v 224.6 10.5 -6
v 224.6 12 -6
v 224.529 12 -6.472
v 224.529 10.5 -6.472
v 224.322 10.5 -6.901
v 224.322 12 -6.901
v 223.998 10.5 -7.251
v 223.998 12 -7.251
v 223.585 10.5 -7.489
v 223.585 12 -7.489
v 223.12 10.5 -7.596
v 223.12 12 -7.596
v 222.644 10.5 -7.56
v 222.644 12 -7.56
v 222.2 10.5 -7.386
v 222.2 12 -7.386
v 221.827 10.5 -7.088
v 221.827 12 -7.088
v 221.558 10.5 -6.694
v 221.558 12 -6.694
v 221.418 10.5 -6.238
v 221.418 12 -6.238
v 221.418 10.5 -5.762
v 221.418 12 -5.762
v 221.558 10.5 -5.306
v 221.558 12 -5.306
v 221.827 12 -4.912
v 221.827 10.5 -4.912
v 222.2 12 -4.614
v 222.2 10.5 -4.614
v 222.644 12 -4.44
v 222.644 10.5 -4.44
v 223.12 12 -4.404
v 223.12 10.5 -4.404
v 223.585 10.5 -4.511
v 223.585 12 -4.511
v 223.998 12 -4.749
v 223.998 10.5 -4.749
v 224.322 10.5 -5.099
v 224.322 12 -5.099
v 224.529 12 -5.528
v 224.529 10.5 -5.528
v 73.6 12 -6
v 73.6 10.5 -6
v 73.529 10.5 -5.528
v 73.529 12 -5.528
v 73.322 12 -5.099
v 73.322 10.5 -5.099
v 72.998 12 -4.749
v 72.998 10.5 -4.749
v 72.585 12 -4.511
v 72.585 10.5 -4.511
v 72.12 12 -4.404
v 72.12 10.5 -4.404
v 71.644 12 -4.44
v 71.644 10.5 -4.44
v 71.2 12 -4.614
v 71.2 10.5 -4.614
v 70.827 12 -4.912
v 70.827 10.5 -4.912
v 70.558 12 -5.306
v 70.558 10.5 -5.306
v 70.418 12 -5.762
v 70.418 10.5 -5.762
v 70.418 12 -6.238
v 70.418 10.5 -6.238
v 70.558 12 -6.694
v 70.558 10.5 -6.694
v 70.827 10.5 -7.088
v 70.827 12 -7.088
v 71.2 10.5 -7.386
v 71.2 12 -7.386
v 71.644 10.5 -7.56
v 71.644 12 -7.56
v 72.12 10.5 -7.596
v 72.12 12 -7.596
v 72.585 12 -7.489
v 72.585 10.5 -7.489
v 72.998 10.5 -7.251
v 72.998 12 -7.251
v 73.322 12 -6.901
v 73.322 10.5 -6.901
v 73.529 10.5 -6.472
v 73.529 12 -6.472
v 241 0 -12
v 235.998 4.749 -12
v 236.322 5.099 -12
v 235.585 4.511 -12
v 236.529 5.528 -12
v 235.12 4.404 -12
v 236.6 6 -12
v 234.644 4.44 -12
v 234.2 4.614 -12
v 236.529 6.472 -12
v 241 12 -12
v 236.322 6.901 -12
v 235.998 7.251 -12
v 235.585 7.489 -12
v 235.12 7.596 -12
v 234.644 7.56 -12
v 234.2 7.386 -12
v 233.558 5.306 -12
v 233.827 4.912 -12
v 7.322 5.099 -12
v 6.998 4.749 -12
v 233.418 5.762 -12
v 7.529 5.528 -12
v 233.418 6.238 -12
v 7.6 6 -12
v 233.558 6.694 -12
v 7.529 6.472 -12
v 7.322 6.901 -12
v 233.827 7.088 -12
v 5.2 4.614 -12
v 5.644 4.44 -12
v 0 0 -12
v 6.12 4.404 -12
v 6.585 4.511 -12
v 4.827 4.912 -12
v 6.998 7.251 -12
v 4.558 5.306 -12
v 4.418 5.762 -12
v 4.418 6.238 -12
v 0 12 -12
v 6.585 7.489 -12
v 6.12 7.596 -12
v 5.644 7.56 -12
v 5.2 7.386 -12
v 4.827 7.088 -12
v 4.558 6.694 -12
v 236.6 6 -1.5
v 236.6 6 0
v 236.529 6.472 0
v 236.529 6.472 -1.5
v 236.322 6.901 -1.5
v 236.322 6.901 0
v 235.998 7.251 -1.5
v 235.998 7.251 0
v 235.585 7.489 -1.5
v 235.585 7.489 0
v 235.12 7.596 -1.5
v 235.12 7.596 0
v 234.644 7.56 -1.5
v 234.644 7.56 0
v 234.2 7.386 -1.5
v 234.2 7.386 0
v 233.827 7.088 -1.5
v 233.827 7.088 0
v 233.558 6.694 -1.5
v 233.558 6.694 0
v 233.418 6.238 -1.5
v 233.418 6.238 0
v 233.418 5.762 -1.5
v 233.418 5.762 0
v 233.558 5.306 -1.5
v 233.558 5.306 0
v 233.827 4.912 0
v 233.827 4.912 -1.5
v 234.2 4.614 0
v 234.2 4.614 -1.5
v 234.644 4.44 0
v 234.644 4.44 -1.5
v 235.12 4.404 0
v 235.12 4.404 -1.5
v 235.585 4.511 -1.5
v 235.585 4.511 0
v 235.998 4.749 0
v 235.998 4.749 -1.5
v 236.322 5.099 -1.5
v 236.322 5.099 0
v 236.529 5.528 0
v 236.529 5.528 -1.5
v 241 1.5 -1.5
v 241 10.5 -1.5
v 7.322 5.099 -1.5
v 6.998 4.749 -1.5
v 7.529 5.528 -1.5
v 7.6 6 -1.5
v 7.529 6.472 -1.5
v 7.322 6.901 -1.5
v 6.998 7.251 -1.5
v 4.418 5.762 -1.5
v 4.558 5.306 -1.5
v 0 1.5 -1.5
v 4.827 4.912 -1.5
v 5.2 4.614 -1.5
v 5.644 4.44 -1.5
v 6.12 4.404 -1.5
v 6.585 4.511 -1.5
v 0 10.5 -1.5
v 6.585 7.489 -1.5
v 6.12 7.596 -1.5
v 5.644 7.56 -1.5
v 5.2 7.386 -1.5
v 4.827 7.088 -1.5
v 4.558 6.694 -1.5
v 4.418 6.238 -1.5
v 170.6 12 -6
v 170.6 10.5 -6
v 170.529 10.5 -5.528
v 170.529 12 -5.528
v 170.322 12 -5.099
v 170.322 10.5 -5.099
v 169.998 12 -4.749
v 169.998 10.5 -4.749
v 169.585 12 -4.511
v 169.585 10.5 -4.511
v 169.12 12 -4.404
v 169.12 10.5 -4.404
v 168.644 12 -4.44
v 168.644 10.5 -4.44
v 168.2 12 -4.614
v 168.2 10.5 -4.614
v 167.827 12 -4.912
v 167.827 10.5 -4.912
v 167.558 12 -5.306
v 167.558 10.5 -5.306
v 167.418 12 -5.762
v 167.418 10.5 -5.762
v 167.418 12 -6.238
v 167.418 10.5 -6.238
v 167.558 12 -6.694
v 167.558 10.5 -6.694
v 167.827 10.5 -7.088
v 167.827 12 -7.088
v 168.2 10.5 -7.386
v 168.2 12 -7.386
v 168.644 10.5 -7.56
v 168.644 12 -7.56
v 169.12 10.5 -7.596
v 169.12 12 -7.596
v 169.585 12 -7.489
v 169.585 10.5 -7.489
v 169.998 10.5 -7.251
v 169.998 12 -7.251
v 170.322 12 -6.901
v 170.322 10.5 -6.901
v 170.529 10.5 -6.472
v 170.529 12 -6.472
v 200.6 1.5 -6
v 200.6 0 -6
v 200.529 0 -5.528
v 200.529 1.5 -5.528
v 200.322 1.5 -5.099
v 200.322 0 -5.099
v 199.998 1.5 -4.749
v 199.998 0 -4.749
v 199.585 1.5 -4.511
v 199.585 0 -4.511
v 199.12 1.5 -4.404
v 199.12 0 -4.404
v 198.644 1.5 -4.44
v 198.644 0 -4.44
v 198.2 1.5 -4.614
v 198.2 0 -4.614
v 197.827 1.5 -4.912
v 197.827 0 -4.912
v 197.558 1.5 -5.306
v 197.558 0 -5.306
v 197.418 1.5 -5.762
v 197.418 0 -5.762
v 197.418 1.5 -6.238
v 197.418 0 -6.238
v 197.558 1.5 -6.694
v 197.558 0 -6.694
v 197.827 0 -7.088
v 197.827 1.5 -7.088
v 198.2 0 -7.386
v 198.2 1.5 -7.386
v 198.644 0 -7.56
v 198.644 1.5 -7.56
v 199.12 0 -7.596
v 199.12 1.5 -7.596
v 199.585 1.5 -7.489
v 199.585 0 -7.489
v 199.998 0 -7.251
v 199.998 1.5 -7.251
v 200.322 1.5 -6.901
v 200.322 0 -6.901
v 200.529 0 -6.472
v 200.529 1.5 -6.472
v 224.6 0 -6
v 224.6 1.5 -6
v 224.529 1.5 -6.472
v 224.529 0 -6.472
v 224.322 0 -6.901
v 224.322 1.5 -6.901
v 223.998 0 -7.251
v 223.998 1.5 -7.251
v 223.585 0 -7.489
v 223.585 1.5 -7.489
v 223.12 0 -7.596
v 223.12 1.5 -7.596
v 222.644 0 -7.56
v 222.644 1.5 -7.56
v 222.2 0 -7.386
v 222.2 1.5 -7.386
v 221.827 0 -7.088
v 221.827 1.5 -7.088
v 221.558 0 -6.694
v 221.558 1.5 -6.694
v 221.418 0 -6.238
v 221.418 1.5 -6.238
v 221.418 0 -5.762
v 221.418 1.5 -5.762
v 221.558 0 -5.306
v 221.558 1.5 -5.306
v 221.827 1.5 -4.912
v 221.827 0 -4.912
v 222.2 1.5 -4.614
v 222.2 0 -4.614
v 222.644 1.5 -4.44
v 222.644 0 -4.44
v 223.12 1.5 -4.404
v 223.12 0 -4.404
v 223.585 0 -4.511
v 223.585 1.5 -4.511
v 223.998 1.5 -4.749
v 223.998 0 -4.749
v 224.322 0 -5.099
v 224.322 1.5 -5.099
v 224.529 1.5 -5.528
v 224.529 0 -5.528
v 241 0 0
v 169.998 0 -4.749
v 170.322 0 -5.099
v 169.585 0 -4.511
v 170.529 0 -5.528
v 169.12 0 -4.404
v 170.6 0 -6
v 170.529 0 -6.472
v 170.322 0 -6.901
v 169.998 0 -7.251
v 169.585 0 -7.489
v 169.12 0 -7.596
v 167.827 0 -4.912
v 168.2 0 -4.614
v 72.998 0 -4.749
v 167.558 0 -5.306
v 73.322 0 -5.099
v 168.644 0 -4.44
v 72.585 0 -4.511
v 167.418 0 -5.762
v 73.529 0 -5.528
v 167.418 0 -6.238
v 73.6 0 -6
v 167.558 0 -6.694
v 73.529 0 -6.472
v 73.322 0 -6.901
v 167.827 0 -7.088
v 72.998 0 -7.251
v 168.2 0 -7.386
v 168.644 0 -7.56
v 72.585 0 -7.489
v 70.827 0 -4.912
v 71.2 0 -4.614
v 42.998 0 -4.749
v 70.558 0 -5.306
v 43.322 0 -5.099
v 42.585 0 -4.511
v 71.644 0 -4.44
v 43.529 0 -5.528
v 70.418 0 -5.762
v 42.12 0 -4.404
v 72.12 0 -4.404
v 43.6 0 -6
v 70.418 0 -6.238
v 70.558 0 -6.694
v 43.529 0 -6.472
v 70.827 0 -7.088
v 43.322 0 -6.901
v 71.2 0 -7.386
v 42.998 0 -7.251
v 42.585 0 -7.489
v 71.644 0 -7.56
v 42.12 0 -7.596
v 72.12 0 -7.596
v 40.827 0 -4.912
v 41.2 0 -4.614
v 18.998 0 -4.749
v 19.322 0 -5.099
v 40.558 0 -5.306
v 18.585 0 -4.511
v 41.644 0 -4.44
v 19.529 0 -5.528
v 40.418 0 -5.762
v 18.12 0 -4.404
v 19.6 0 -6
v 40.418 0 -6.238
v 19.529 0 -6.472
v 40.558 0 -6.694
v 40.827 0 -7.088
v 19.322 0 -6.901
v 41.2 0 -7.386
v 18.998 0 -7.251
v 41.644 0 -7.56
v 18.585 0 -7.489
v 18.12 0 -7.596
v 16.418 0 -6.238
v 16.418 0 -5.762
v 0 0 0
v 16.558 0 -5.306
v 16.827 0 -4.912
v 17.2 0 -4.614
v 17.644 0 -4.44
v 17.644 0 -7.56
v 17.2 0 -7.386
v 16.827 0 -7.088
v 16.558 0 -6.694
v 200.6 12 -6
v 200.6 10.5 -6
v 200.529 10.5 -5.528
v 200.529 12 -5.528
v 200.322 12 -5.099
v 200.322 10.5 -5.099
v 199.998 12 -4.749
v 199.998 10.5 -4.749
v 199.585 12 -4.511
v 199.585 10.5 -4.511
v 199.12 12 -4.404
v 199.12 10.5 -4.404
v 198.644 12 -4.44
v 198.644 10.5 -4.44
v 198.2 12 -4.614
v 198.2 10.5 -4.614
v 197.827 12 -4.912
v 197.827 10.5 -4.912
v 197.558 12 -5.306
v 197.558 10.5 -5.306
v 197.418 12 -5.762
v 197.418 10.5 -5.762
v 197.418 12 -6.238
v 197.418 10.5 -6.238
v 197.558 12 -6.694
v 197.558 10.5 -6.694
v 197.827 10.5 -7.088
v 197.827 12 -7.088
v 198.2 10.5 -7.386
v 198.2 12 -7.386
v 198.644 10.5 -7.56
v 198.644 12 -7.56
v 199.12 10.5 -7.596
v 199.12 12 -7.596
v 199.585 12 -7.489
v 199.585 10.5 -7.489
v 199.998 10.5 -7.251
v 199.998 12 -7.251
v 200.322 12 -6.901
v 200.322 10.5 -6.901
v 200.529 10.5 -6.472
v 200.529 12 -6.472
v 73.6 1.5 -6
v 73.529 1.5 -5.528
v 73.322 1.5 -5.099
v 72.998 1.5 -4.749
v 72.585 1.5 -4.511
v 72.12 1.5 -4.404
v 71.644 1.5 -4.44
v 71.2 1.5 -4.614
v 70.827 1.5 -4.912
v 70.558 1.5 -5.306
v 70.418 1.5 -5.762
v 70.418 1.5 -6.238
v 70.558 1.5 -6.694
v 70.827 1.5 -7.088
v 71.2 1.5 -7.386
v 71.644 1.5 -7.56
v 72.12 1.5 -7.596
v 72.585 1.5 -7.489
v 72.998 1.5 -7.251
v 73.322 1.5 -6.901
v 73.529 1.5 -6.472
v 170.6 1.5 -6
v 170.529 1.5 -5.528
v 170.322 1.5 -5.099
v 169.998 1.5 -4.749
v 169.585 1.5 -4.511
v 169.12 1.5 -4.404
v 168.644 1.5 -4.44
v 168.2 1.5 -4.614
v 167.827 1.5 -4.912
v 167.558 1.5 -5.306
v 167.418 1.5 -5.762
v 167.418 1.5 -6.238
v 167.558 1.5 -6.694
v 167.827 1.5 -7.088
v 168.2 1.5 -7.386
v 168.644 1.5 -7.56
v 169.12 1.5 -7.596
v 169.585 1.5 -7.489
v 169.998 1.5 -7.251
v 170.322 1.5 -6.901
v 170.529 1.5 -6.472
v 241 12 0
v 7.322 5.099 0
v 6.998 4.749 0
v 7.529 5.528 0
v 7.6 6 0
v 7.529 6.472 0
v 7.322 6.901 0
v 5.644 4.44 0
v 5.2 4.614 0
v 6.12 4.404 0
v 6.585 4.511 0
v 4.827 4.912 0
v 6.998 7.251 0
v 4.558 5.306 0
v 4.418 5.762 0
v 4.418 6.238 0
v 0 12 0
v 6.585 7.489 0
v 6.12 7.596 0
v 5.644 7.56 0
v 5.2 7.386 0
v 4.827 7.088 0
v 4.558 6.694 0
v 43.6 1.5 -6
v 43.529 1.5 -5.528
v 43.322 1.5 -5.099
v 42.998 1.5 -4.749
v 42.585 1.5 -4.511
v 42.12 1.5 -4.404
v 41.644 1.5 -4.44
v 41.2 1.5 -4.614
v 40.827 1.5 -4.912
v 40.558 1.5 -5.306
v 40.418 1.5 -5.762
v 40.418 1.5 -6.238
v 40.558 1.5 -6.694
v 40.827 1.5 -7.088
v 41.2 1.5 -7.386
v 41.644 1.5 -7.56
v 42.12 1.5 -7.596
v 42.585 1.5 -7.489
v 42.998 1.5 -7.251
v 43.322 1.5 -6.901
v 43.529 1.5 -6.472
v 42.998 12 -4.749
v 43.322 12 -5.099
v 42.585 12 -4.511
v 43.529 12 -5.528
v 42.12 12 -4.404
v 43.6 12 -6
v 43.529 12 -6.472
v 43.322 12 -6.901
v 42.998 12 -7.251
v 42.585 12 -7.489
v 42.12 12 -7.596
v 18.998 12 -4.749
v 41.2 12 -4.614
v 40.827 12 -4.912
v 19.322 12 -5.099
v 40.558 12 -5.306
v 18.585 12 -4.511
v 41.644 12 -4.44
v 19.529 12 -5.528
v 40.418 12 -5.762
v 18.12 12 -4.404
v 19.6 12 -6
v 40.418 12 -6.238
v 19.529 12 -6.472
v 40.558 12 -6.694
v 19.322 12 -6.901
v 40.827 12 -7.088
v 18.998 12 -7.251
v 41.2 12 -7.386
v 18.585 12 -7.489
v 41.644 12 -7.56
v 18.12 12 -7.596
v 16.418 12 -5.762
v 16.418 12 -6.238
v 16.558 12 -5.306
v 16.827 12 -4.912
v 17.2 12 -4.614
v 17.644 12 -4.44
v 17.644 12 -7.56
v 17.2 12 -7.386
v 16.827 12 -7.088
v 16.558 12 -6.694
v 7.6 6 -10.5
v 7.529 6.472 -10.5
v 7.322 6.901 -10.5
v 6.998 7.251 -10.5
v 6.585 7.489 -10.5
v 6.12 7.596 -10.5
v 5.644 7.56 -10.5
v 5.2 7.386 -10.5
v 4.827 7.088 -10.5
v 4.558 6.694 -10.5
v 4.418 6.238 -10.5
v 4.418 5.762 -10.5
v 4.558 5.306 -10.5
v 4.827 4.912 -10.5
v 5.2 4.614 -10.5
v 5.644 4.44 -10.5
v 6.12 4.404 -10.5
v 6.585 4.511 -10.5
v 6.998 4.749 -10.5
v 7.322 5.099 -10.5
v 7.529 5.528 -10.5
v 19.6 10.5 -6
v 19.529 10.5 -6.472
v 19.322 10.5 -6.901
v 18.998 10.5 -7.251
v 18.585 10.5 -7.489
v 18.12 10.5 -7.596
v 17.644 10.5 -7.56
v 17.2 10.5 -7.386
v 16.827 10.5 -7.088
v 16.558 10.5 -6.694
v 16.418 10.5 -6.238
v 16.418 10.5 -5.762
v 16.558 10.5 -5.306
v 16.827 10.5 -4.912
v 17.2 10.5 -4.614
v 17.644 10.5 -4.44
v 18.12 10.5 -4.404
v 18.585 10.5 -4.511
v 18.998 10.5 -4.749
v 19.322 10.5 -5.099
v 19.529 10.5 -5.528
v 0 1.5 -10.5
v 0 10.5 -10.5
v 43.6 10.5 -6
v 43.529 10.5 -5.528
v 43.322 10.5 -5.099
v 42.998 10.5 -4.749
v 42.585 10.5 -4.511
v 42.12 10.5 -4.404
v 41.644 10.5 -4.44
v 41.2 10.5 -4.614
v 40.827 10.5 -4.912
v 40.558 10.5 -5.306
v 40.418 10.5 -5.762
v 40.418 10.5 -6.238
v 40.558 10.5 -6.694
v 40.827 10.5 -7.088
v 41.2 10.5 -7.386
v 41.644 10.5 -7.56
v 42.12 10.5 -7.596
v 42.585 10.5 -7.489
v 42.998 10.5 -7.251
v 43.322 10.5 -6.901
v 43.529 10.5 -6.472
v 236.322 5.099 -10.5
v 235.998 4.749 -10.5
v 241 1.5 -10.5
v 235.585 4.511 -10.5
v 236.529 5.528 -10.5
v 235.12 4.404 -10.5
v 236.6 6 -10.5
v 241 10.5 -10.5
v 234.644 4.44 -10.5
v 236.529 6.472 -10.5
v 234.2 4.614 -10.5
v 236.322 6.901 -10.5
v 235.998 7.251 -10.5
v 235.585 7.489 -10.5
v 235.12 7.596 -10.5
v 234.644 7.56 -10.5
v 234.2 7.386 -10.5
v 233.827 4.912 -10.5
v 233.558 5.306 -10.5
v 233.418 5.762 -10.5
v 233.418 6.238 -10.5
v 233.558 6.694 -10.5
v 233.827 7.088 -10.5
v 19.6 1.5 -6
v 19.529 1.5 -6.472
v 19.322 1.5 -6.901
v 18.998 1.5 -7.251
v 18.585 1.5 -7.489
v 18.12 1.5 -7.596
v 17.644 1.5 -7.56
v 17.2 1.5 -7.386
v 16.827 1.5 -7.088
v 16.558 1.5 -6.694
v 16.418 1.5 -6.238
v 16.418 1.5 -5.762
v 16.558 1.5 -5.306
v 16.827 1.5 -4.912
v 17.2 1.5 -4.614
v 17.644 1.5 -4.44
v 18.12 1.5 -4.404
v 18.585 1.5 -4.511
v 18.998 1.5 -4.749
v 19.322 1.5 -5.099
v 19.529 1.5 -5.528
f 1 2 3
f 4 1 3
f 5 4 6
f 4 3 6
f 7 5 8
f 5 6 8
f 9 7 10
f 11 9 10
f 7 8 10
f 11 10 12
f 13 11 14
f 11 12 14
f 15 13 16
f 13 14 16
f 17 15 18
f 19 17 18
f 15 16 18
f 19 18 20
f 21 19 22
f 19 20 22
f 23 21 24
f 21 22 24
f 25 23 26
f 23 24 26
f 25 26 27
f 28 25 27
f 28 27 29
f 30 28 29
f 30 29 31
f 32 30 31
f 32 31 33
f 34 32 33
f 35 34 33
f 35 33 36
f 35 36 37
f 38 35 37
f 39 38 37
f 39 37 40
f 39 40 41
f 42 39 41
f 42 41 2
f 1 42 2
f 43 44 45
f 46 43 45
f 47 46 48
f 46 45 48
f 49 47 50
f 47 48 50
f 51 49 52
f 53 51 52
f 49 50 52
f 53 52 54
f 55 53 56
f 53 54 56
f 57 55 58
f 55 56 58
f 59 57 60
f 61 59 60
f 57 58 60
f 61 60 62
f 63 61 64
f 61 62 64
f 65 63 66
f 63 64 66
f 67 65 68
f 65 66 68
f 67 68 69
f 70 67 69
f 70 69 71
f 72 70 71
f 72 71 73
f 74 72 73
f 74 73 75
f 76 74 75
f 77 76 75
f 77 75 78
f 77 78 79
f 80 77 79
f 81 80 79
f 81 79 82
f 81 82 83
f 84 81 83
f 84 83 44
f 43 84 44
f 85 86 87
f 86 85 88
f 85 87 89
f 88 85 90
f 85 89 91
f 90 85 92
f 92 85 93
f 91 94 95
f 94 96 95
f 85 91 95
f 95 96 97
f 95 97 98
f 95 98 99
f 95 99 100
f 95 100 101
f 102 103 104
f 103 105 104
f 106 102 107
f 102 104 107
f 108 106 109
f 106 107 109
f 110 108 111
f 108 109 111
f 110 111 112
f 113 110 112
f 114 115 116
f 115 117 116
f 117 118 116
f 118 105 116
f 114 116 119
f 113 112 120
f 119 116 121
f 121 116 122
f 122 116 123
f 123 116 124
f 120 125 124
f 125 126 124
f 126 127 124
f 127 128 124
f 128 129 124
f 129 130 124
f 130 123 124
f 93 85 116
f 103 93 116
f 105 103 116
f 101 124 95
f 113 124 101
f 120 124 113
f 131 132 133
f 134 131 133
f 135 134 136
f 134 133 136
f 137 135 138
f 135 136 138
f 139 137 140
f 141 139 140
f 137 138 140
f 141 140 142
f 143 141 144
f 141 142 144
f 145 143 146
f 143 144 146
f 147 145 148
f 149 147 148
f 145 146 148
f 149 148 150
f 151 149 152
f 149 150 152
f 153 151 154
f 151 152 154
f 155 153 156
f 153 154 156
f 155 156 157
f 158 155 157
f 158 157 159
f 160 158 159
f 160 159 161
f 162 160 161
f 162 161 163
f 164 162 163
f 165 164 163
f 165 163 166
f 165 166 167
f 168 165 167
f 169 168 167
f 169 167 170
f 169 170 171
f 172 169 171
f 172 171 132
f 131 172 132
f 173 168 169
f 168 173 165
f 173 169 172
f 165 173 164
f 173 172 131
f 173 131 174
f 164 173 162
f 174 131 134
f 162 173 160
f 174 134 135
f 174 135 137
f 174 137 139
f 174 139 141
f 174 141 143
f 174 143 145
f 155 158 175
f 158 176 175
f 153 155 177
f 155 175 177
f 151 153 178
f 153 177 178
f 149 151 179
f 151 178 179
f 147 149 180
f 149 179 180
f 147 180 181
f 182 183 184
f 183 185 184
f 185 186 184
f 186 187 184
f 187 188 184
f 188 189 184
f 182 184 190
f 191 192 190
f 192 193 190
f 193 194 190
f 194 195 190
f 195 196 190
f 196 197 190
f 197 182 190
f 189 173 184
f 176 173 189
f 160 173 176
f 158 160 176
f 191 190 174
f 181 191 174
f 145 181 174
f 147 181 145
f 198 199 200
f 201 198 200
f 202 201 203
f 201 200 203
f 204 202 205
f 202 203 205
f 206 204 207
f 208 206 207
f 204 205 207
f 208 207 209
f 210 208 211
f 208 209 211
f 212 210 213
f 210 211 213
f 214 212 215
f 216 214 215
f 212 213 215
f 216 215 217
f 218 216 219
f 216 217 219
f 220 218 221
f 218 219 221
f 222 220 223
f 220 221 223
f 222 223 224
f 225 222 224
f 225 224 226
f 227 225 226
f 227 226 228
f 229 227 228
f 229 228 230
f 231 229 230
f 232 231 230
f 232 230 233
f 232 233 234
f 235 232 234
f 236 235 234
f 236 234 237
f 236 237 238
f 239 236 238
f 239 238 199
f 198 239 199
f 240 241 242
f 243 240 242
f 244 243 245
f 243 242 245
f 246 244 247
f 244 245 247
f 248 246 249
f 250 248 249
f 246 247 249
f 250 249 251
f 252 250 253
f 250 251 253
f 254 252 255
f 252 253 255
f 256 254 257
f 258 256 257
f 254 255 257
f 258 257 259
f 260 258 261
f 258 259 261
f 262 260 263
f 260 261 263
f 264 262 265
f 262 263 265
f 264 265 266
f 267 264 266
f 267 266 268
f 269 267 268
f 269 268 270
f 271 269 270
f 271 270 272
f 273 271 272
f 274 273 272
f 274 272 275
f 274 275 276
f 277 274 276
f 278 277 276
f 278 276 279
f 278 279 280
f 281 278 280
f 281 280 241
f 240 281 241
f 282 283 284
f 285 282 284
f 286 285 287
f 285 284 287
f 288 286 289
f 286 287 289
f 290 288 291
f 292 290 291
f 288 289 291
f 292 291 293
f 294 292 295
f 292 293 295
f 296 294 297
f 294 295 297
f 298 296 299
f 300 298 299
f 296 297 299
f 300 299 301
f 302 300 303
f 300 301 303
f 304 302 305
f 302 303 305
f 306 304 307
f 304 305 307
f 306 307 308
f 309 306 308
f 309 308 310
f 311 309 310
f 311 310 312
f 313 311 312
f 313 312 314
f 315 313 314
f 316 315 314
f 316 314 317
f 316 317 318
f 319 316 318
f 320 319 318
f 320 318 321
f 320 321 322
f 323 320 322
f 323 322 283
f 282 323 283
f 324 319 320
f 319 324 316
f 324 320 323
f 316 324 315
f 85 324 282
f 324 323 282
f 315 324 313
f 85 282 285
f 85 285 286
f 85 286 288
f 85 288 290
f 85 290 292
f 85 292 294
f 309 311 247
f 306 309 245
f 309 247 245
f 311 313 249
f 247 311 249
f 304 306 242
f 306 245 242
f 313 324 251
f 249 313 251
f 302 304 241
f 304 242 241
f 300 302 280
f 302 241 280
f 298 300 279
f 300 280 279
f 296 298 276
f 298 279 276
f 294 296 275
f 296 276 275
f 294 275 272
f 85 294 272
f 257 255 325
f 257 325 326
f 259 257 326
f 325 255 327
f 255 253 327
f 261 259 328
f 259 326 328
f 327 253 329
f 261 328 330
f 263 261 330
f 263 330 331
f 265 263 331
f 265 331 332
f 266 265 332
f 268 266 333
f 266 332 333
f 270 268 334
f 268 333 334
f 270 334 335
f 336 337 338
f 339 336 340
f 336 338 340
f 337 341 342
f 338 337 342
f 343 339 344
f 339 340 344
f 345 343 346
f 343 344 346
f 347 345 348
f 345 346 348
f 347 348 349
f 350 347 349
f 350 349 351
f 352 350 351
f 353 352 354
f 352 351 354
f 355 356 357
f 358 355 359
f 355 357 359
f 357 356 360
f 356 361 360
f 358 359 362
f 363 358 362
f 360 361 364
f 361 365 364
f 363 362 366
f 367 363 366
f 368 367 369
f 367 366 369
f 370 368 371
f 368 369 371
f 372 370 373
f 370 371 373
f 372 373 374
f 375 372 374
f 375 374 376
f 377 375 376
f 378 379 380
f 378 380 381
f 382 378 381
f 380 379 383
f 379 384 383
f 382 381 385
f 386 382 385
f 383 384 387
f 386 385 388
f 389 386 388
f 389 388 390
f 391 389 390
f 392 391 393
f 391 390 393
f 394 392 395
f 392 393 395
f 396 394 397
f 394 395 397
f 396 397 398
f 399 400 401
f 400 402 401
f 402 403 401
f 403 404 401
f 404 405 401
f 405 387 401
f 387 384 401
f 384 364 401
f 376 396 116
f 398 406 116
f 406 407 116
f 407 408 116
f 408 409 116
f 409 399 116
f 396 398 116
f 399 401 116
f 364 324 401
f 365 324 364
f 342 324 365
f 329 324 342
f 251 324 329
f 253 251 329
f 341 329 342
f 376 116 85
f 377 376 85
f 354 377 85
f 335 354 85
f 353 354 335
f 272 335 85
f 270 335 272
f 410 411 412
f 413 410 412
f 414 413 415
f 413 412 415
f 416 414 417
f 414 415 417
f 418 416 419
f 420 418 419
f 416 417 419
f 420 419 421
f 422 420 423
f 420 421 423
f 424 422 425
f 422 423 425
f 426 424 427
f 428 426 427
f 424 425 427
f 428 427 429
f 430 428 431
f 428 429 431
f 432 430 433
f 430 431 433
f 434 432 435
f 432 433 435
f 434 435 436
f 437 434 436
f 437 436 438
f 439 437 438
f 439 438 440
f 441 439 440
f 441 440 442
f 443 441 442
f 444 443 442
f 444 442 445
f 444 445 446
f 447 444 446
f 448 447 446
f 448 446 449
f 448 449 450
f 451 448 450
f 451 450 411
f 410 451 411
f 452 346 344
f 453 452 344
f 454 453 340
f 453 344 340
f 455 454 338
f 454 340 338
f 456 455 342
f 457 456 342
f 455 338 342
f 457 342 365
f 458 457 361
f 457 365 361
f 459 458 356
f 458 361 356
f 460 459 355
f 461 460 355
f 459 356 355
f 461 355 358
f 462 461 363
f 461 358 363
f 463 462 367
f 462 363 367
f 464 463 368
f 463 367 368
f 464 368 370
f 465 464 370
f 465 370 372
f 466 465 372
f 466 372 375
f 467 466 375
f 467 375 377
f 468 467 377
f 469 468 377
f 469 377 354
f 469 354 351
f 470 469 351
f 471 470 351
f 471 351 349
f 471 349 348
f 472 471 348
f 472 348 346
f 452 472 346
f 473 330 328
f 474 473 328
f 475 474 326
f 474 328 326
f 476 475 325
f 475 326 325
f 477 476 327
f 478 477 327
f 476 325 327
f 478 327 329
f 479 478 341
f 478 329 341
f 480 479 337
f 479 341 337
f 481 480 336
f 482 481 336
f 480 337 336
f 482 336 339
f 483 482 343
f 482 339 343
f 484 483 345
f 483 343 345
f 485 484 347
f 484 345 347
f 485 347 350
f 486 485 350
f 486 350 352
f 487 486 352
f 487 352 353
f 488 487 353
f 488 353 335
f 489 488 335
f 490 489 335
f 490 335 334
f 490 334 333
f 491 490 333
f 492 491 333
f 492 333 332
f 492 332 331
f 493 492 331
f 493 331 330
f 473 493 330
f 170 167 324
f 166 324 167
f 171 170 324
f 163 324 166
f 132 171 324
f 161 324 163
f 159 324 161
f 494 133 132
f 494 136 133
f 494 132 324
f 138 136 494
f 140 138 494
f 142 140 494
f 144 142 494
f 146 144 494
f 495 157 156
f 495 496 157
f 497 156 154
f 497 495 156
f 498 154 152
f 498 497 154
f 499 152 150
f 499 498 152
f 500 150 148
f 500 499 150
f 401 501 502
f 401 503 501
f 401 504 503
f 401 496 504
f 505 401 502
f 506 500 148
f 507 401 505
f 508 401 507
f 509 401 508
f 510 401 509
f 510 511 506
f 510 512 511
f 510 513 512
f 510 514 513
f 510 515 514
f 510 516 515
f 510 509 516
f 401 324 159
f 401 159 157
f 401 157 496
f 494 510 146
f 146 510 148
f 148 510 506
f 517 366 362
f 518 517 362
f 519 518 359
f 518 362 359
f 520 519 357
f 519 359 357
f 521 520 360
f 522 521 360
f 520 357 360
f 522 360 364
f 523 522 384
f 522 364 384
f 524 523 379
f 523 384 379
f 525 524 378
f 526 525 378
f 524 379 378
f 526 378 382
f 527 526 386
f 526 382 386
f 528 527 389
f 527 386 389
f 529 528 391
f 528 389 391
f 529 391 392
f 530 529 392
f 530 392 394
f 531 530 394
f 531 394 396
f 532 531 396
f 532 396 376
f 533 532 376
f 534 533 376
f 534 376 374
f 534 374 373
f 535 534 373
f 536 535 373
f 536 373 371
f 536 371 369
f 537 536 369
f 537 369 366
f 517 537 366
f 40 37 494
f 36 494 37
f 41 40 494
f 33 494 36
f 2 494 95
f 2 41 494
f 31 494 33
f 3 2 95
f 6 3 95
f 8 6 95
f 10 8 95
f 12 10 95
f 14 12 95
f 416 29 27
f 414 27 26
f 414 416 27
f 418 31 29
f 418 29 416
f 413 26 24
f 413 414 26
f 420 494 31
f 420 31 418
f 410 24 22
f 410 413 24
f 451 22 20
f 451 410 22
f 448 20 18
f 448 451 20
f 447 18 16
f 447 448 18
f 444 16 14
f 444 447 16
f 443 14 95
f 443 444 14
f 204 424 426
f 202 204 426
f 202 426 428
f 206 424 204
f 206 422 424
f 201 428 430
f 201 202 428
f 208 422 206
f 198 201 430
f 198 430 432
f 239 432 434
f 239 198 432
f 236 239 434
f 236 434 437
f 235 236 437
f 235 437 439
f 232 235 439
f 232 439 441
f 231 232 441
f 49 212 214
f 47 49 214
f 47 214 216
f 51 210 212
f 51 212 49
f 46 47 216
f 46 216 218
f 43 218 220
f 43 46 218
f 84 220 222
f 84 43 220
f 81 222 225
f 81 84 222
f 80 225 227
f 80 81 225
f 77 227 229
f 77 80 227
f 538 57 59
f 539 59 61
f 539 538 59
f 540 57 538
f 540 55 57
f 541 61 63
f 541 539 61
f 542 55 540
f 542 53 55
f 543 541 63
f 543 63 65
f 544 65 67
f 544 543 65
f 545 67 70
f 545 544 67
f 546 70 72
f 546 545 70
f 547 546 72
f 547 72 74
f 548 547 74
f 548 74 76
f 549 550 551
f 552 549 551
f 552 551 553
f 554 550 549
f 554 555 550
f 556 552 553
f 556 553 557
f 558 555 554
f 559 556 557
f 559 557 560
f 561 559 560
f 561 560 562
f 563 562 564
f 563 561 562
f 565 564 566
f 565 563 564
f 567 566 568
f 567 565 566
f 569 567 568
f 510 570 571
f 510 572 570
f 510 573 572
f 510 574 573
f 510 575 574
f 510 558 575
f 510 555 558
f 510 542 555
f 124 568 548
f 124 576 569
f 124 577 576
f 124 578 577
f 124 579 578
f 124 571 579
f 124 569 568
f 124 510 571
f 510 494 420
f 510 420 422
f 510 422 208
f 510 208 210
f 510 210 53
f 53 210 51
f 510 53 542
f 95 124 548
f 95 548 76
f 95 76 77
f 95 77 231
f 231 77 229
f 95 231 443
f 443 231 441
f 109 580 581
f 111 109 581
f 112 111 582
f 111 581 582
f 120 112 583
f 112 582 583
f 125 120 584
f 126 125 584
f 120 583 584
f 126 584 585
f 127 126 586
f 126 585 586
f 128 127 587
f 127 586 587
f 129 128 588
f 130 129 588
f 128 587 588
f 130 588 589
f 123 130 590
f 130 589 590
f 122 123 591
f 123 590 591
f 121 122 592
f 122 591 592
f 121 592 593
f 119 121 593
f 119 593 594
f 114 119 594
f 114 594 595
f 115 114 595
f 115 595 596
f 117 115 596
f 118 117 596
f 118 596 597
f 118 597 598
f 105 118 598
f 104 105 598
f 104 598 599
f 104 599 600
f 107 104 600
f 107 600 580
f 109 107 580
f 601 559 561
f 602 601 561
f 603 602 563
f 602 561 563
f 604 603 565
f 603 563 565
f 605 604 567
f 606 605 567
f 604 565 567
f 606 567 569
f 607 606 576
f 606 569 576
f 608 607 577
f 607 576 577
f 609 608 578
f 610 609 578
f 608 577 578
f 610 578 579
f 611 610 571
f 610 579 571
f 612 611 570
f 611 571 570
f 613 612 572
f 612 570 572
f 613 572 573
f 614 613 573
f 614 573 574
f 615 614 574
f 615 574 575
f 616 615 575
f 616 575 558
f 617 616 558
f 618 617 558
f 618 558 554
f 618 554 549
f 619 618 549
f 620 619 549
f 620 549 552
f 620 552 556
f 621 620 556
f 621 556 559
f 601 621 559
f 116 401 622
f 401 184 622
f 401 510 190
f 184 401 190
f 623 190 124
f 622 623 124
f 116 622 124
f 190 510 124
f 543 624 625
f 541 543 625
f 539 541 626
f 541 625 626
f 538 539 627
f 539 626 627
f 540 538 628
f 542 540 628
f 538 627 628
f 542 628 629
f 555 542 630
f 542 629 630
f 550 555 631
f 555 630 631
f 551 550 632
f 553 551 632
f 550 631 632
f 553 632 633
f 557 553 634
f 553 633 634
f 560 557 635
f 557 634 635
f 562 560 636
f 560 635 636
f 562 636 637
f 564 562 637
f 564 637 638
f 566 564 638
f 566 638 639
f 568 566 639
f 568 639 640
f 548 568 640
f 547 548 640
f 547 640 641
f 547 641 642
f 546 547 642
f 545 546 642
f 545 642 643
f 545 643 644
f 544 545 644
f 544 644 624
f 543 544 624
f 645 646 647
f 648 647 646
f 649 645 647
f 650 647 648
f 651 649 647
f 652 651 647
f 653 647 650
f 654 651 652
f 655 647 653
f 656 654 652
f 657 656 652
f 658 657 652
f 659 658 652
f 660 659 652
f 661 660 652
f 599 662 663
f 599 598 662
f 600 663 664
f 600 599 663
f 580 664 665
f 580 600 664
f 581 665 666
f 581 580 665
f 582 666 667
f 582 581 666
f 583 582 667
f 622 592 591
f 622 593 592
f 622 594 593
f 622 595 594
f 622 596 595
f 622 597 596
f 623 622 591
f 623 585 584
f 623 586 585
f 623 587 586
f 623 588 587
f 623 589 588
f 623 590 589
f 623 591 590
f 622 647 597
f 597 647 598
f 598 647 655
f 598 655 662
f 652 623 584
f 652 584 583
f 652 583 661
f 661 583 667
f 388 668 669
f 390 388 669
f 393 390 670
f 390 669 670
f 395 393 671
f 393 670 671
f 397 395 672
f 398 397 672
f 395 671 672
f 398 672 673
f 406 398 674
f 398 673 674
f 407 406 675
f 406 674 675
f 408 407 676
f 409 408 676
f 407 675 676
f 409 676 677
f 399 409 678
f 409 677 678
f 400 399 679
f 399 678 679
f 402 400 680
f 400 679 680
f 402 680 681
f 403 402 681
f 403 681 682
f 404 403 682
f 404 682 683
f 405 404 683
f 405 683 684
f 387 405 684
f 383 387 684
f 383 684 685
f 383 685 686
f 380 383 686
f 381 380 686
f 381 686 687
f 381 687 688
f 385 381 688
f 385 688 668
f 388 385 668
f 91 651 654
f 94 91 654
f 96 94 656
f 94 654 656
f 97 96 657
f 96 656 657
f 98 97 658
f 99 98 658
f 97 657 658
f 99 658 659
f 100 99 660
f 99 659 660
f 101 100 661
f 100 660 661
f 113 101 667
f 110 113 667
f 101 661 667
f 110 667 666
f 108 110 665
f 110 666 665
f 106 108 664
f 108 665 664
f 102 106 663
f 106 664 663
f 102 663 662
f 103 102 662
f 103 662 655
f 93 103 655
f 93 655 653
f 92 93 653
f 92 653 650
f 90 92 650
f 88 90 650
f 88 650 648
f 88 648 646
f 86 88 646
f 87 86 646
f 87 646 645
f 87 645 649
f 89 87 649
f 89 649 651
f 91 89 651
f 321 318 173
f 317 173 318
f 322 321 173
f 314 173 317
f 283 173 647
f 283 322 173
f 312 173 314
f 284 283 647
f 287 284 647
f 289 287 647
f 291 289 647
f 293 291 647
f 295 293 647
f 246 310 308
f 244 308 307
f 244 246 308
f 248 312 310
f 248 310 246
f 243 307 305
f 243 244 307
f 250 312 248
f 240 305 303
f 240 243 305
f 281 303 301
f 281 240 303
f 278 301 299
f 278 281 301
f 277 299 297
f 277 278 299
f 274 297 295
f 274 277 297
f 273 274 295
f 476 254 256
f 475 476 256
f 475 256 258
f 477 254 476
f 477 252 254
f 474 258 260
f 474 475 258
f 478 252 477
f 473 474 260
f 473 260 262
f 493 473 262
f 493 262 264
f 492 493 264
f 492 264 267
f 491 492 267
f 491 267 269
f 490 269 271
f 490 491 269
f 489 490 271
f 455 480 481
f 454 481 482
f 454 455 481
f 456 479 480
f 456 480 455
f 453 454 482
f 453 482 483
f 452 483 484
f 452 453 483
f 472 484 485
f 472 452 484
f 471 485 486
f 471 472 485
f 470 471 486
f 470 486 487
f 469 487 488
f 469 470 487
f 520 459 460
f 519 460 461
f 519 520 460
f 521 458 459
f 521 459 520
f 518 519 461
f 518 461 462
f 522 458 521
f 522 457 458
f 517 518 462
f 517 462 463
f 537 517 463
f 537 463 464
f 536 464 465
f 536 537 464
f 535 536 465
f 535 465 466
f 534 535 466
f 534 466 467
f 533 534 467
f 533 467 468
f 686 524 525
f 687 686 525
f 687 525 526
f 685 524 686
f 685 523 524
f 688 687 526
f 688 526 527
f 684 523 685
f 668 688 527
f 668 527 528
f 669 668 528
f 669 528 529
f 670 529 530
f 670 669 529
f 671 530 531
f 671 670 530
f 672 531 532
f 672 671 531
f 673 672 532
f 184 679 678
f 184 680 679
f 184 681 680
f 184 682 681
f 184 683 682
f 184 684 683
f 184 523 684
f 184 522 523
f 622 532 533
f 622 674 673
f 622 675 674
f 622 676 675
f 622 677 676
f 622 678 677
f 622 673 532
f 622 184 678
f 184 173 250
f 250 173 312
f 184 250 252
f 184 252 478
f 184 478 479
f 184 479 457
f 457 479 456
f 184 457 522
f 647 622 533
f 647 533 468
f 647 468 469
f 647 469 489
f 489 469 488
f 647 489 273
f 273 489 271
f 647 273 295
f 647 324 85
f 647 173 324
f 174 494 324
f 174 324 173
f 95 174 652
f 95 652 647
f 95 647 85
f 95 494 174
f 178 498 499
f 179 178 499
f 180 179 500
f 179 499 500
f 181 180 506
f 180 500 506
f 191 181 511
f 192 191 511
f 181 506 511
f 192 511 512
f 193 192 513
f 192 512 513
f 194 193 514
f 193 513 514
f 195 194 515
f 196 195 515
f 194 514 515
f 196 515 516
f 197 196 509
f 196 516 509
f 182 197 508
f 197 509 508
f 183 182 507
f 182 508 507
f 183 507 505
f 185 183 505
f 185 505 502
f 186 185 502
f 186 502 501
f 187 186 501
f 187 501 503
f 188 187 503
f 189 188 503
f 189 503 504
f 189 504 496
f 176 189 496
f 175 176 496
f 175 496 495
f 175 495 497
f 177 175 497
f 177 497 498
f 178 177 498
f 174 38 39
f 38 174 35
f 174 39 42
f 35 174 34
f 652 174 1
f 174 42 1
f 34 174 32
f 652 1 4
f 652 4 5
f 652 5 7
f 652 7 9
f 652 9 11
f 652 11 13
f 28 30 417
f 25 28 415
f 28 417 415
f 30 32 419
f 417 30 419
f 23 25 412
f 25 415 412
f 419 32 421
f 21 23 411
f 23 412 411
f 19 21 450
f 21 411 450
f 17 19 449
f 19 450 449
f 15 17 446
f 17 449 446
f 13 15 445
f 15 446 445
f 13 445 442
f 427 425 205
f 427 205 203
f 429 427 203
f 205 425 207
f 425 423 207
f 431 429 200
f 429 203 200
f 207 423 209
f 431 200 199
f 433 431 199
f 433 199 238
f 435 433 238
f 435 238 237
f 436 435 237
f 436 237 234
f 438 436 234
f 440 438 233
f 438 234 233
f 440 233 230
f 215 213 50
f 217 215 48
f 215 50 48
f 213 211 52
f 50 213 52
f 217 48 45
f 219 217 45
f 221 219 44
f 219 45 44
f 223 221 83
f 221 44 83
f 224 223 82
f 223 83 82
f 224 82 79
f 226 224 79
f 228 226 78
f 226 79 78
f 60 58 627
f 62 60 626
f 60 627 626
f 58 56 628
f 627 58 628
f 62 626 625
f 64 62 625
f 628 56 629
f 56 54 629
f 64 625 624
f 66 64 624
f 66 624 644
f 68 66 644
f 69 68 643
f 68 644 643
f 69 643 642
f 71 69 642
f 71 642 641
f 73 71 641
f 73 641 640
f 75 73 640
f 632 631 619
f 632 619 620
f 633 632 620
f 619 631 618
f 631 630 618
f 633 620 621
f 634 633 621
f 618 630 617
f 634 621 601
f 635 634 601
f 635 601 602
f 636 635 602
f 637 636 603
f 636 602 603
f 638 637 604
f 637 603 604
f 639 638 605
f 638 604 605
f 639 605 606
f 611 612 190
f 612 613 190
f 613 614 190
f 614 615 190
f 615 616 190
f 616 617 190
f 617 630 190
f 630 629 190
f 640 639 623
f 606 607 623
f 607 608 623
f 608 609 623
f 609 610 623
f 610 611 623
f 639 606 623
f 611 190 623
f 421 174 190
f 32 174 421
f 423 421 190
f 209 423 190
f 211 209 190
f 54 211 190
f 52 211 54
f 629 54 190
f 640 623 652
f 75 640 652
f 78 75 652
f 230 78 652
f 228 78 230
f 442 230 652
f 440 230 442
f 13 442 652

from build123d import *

# Parameters (mm, degrees)
SKETCH_1_W          = 12
SKETCH_1_H          = 12
SKETCH_1_W_2        = 9
SKETCH_1_H_2        = 9
EXTRUDE_1_DEPTH     = 241
SKETCH_2_R          = 1.6
CUT_EXTRUDE_1_DEPTH = 13
SKETCH_3_R          = 1.6
CUT_EXTRUDE_2_DEPTH = 13
SKETCH_4_R          = 1.6
CUT_EXTRUDE_3_DEPTH = 13


with BuildPart() as part:
    # ｽｹｯﾁ1 → ﾎﾞｽ - 押し出し1 (new body)
    with BuildSketch(Plane(origin=(0, 0, 0), x_dir=(0, 0, -1), z_dir=(1, 0, 0))):
        with Locations((6, 6)):
            Rectangle(SKETCH_1_W, SKETCH_1_H)
        with Locations((6, 6)):
            Rectangle(SKETCH_1_W_2, SKETCH_1_H_2, mode=Mode.SUBTRACT)
    extrude(amount=EXTRUDE_1_DEPTH)

    # ｽｹｯﾁ2 → ｶｯﾄ - 押し出し1 (cut, through all)
    with BuildSketch(Plane(origin=(0, 12, 0), x_dir=(1, 0, 0), z_dir=(0, 1, 0))):
        with Locations((18, 6)):
            Circle(SKETCH_2_R)
        with Locations((223, 6)):
            Circle(SKETCH_2_R)
    extrude(amount=-CUT_EXTRUDE_1_DEPTH, mode=Mode.SUBTRACT)

    # ｽｹｯﾁ3 → ｶｯﾄ - 押し出し2 (cut, through all)
    with BuildSketch(Plane.XY):
        with Locations((6, 6)):
            Circle(SKETCH_3_R)
        with Locations((235, 6)):
            Circle(SKETCH_3_R)
    extrude(amount=-CUT_EXTRUDE_2_DEPTH, mode=Mode.SUBTRACT)

    # ｽｹｯﾁ4 → ｶｯﾄ - 押し出し3 (cut, through all)
    with BuildSketch(Plane.XZ):
        with Locations((42, -6)):
            Circle(SKETCH_4_R)
        with Locations((72, -6)):
            Circle(SKETCH_4_R)
        with Locations((169, -6)):
            Circle(SKETCH_4_R)
        with Locations((199, -6)):
            Circle(SKETCH_4_R)
    extrude(amount=-CUT_EXTRUDE_3_DEPTH, mode=Mode.SUBTRACT)


solid = part.part
